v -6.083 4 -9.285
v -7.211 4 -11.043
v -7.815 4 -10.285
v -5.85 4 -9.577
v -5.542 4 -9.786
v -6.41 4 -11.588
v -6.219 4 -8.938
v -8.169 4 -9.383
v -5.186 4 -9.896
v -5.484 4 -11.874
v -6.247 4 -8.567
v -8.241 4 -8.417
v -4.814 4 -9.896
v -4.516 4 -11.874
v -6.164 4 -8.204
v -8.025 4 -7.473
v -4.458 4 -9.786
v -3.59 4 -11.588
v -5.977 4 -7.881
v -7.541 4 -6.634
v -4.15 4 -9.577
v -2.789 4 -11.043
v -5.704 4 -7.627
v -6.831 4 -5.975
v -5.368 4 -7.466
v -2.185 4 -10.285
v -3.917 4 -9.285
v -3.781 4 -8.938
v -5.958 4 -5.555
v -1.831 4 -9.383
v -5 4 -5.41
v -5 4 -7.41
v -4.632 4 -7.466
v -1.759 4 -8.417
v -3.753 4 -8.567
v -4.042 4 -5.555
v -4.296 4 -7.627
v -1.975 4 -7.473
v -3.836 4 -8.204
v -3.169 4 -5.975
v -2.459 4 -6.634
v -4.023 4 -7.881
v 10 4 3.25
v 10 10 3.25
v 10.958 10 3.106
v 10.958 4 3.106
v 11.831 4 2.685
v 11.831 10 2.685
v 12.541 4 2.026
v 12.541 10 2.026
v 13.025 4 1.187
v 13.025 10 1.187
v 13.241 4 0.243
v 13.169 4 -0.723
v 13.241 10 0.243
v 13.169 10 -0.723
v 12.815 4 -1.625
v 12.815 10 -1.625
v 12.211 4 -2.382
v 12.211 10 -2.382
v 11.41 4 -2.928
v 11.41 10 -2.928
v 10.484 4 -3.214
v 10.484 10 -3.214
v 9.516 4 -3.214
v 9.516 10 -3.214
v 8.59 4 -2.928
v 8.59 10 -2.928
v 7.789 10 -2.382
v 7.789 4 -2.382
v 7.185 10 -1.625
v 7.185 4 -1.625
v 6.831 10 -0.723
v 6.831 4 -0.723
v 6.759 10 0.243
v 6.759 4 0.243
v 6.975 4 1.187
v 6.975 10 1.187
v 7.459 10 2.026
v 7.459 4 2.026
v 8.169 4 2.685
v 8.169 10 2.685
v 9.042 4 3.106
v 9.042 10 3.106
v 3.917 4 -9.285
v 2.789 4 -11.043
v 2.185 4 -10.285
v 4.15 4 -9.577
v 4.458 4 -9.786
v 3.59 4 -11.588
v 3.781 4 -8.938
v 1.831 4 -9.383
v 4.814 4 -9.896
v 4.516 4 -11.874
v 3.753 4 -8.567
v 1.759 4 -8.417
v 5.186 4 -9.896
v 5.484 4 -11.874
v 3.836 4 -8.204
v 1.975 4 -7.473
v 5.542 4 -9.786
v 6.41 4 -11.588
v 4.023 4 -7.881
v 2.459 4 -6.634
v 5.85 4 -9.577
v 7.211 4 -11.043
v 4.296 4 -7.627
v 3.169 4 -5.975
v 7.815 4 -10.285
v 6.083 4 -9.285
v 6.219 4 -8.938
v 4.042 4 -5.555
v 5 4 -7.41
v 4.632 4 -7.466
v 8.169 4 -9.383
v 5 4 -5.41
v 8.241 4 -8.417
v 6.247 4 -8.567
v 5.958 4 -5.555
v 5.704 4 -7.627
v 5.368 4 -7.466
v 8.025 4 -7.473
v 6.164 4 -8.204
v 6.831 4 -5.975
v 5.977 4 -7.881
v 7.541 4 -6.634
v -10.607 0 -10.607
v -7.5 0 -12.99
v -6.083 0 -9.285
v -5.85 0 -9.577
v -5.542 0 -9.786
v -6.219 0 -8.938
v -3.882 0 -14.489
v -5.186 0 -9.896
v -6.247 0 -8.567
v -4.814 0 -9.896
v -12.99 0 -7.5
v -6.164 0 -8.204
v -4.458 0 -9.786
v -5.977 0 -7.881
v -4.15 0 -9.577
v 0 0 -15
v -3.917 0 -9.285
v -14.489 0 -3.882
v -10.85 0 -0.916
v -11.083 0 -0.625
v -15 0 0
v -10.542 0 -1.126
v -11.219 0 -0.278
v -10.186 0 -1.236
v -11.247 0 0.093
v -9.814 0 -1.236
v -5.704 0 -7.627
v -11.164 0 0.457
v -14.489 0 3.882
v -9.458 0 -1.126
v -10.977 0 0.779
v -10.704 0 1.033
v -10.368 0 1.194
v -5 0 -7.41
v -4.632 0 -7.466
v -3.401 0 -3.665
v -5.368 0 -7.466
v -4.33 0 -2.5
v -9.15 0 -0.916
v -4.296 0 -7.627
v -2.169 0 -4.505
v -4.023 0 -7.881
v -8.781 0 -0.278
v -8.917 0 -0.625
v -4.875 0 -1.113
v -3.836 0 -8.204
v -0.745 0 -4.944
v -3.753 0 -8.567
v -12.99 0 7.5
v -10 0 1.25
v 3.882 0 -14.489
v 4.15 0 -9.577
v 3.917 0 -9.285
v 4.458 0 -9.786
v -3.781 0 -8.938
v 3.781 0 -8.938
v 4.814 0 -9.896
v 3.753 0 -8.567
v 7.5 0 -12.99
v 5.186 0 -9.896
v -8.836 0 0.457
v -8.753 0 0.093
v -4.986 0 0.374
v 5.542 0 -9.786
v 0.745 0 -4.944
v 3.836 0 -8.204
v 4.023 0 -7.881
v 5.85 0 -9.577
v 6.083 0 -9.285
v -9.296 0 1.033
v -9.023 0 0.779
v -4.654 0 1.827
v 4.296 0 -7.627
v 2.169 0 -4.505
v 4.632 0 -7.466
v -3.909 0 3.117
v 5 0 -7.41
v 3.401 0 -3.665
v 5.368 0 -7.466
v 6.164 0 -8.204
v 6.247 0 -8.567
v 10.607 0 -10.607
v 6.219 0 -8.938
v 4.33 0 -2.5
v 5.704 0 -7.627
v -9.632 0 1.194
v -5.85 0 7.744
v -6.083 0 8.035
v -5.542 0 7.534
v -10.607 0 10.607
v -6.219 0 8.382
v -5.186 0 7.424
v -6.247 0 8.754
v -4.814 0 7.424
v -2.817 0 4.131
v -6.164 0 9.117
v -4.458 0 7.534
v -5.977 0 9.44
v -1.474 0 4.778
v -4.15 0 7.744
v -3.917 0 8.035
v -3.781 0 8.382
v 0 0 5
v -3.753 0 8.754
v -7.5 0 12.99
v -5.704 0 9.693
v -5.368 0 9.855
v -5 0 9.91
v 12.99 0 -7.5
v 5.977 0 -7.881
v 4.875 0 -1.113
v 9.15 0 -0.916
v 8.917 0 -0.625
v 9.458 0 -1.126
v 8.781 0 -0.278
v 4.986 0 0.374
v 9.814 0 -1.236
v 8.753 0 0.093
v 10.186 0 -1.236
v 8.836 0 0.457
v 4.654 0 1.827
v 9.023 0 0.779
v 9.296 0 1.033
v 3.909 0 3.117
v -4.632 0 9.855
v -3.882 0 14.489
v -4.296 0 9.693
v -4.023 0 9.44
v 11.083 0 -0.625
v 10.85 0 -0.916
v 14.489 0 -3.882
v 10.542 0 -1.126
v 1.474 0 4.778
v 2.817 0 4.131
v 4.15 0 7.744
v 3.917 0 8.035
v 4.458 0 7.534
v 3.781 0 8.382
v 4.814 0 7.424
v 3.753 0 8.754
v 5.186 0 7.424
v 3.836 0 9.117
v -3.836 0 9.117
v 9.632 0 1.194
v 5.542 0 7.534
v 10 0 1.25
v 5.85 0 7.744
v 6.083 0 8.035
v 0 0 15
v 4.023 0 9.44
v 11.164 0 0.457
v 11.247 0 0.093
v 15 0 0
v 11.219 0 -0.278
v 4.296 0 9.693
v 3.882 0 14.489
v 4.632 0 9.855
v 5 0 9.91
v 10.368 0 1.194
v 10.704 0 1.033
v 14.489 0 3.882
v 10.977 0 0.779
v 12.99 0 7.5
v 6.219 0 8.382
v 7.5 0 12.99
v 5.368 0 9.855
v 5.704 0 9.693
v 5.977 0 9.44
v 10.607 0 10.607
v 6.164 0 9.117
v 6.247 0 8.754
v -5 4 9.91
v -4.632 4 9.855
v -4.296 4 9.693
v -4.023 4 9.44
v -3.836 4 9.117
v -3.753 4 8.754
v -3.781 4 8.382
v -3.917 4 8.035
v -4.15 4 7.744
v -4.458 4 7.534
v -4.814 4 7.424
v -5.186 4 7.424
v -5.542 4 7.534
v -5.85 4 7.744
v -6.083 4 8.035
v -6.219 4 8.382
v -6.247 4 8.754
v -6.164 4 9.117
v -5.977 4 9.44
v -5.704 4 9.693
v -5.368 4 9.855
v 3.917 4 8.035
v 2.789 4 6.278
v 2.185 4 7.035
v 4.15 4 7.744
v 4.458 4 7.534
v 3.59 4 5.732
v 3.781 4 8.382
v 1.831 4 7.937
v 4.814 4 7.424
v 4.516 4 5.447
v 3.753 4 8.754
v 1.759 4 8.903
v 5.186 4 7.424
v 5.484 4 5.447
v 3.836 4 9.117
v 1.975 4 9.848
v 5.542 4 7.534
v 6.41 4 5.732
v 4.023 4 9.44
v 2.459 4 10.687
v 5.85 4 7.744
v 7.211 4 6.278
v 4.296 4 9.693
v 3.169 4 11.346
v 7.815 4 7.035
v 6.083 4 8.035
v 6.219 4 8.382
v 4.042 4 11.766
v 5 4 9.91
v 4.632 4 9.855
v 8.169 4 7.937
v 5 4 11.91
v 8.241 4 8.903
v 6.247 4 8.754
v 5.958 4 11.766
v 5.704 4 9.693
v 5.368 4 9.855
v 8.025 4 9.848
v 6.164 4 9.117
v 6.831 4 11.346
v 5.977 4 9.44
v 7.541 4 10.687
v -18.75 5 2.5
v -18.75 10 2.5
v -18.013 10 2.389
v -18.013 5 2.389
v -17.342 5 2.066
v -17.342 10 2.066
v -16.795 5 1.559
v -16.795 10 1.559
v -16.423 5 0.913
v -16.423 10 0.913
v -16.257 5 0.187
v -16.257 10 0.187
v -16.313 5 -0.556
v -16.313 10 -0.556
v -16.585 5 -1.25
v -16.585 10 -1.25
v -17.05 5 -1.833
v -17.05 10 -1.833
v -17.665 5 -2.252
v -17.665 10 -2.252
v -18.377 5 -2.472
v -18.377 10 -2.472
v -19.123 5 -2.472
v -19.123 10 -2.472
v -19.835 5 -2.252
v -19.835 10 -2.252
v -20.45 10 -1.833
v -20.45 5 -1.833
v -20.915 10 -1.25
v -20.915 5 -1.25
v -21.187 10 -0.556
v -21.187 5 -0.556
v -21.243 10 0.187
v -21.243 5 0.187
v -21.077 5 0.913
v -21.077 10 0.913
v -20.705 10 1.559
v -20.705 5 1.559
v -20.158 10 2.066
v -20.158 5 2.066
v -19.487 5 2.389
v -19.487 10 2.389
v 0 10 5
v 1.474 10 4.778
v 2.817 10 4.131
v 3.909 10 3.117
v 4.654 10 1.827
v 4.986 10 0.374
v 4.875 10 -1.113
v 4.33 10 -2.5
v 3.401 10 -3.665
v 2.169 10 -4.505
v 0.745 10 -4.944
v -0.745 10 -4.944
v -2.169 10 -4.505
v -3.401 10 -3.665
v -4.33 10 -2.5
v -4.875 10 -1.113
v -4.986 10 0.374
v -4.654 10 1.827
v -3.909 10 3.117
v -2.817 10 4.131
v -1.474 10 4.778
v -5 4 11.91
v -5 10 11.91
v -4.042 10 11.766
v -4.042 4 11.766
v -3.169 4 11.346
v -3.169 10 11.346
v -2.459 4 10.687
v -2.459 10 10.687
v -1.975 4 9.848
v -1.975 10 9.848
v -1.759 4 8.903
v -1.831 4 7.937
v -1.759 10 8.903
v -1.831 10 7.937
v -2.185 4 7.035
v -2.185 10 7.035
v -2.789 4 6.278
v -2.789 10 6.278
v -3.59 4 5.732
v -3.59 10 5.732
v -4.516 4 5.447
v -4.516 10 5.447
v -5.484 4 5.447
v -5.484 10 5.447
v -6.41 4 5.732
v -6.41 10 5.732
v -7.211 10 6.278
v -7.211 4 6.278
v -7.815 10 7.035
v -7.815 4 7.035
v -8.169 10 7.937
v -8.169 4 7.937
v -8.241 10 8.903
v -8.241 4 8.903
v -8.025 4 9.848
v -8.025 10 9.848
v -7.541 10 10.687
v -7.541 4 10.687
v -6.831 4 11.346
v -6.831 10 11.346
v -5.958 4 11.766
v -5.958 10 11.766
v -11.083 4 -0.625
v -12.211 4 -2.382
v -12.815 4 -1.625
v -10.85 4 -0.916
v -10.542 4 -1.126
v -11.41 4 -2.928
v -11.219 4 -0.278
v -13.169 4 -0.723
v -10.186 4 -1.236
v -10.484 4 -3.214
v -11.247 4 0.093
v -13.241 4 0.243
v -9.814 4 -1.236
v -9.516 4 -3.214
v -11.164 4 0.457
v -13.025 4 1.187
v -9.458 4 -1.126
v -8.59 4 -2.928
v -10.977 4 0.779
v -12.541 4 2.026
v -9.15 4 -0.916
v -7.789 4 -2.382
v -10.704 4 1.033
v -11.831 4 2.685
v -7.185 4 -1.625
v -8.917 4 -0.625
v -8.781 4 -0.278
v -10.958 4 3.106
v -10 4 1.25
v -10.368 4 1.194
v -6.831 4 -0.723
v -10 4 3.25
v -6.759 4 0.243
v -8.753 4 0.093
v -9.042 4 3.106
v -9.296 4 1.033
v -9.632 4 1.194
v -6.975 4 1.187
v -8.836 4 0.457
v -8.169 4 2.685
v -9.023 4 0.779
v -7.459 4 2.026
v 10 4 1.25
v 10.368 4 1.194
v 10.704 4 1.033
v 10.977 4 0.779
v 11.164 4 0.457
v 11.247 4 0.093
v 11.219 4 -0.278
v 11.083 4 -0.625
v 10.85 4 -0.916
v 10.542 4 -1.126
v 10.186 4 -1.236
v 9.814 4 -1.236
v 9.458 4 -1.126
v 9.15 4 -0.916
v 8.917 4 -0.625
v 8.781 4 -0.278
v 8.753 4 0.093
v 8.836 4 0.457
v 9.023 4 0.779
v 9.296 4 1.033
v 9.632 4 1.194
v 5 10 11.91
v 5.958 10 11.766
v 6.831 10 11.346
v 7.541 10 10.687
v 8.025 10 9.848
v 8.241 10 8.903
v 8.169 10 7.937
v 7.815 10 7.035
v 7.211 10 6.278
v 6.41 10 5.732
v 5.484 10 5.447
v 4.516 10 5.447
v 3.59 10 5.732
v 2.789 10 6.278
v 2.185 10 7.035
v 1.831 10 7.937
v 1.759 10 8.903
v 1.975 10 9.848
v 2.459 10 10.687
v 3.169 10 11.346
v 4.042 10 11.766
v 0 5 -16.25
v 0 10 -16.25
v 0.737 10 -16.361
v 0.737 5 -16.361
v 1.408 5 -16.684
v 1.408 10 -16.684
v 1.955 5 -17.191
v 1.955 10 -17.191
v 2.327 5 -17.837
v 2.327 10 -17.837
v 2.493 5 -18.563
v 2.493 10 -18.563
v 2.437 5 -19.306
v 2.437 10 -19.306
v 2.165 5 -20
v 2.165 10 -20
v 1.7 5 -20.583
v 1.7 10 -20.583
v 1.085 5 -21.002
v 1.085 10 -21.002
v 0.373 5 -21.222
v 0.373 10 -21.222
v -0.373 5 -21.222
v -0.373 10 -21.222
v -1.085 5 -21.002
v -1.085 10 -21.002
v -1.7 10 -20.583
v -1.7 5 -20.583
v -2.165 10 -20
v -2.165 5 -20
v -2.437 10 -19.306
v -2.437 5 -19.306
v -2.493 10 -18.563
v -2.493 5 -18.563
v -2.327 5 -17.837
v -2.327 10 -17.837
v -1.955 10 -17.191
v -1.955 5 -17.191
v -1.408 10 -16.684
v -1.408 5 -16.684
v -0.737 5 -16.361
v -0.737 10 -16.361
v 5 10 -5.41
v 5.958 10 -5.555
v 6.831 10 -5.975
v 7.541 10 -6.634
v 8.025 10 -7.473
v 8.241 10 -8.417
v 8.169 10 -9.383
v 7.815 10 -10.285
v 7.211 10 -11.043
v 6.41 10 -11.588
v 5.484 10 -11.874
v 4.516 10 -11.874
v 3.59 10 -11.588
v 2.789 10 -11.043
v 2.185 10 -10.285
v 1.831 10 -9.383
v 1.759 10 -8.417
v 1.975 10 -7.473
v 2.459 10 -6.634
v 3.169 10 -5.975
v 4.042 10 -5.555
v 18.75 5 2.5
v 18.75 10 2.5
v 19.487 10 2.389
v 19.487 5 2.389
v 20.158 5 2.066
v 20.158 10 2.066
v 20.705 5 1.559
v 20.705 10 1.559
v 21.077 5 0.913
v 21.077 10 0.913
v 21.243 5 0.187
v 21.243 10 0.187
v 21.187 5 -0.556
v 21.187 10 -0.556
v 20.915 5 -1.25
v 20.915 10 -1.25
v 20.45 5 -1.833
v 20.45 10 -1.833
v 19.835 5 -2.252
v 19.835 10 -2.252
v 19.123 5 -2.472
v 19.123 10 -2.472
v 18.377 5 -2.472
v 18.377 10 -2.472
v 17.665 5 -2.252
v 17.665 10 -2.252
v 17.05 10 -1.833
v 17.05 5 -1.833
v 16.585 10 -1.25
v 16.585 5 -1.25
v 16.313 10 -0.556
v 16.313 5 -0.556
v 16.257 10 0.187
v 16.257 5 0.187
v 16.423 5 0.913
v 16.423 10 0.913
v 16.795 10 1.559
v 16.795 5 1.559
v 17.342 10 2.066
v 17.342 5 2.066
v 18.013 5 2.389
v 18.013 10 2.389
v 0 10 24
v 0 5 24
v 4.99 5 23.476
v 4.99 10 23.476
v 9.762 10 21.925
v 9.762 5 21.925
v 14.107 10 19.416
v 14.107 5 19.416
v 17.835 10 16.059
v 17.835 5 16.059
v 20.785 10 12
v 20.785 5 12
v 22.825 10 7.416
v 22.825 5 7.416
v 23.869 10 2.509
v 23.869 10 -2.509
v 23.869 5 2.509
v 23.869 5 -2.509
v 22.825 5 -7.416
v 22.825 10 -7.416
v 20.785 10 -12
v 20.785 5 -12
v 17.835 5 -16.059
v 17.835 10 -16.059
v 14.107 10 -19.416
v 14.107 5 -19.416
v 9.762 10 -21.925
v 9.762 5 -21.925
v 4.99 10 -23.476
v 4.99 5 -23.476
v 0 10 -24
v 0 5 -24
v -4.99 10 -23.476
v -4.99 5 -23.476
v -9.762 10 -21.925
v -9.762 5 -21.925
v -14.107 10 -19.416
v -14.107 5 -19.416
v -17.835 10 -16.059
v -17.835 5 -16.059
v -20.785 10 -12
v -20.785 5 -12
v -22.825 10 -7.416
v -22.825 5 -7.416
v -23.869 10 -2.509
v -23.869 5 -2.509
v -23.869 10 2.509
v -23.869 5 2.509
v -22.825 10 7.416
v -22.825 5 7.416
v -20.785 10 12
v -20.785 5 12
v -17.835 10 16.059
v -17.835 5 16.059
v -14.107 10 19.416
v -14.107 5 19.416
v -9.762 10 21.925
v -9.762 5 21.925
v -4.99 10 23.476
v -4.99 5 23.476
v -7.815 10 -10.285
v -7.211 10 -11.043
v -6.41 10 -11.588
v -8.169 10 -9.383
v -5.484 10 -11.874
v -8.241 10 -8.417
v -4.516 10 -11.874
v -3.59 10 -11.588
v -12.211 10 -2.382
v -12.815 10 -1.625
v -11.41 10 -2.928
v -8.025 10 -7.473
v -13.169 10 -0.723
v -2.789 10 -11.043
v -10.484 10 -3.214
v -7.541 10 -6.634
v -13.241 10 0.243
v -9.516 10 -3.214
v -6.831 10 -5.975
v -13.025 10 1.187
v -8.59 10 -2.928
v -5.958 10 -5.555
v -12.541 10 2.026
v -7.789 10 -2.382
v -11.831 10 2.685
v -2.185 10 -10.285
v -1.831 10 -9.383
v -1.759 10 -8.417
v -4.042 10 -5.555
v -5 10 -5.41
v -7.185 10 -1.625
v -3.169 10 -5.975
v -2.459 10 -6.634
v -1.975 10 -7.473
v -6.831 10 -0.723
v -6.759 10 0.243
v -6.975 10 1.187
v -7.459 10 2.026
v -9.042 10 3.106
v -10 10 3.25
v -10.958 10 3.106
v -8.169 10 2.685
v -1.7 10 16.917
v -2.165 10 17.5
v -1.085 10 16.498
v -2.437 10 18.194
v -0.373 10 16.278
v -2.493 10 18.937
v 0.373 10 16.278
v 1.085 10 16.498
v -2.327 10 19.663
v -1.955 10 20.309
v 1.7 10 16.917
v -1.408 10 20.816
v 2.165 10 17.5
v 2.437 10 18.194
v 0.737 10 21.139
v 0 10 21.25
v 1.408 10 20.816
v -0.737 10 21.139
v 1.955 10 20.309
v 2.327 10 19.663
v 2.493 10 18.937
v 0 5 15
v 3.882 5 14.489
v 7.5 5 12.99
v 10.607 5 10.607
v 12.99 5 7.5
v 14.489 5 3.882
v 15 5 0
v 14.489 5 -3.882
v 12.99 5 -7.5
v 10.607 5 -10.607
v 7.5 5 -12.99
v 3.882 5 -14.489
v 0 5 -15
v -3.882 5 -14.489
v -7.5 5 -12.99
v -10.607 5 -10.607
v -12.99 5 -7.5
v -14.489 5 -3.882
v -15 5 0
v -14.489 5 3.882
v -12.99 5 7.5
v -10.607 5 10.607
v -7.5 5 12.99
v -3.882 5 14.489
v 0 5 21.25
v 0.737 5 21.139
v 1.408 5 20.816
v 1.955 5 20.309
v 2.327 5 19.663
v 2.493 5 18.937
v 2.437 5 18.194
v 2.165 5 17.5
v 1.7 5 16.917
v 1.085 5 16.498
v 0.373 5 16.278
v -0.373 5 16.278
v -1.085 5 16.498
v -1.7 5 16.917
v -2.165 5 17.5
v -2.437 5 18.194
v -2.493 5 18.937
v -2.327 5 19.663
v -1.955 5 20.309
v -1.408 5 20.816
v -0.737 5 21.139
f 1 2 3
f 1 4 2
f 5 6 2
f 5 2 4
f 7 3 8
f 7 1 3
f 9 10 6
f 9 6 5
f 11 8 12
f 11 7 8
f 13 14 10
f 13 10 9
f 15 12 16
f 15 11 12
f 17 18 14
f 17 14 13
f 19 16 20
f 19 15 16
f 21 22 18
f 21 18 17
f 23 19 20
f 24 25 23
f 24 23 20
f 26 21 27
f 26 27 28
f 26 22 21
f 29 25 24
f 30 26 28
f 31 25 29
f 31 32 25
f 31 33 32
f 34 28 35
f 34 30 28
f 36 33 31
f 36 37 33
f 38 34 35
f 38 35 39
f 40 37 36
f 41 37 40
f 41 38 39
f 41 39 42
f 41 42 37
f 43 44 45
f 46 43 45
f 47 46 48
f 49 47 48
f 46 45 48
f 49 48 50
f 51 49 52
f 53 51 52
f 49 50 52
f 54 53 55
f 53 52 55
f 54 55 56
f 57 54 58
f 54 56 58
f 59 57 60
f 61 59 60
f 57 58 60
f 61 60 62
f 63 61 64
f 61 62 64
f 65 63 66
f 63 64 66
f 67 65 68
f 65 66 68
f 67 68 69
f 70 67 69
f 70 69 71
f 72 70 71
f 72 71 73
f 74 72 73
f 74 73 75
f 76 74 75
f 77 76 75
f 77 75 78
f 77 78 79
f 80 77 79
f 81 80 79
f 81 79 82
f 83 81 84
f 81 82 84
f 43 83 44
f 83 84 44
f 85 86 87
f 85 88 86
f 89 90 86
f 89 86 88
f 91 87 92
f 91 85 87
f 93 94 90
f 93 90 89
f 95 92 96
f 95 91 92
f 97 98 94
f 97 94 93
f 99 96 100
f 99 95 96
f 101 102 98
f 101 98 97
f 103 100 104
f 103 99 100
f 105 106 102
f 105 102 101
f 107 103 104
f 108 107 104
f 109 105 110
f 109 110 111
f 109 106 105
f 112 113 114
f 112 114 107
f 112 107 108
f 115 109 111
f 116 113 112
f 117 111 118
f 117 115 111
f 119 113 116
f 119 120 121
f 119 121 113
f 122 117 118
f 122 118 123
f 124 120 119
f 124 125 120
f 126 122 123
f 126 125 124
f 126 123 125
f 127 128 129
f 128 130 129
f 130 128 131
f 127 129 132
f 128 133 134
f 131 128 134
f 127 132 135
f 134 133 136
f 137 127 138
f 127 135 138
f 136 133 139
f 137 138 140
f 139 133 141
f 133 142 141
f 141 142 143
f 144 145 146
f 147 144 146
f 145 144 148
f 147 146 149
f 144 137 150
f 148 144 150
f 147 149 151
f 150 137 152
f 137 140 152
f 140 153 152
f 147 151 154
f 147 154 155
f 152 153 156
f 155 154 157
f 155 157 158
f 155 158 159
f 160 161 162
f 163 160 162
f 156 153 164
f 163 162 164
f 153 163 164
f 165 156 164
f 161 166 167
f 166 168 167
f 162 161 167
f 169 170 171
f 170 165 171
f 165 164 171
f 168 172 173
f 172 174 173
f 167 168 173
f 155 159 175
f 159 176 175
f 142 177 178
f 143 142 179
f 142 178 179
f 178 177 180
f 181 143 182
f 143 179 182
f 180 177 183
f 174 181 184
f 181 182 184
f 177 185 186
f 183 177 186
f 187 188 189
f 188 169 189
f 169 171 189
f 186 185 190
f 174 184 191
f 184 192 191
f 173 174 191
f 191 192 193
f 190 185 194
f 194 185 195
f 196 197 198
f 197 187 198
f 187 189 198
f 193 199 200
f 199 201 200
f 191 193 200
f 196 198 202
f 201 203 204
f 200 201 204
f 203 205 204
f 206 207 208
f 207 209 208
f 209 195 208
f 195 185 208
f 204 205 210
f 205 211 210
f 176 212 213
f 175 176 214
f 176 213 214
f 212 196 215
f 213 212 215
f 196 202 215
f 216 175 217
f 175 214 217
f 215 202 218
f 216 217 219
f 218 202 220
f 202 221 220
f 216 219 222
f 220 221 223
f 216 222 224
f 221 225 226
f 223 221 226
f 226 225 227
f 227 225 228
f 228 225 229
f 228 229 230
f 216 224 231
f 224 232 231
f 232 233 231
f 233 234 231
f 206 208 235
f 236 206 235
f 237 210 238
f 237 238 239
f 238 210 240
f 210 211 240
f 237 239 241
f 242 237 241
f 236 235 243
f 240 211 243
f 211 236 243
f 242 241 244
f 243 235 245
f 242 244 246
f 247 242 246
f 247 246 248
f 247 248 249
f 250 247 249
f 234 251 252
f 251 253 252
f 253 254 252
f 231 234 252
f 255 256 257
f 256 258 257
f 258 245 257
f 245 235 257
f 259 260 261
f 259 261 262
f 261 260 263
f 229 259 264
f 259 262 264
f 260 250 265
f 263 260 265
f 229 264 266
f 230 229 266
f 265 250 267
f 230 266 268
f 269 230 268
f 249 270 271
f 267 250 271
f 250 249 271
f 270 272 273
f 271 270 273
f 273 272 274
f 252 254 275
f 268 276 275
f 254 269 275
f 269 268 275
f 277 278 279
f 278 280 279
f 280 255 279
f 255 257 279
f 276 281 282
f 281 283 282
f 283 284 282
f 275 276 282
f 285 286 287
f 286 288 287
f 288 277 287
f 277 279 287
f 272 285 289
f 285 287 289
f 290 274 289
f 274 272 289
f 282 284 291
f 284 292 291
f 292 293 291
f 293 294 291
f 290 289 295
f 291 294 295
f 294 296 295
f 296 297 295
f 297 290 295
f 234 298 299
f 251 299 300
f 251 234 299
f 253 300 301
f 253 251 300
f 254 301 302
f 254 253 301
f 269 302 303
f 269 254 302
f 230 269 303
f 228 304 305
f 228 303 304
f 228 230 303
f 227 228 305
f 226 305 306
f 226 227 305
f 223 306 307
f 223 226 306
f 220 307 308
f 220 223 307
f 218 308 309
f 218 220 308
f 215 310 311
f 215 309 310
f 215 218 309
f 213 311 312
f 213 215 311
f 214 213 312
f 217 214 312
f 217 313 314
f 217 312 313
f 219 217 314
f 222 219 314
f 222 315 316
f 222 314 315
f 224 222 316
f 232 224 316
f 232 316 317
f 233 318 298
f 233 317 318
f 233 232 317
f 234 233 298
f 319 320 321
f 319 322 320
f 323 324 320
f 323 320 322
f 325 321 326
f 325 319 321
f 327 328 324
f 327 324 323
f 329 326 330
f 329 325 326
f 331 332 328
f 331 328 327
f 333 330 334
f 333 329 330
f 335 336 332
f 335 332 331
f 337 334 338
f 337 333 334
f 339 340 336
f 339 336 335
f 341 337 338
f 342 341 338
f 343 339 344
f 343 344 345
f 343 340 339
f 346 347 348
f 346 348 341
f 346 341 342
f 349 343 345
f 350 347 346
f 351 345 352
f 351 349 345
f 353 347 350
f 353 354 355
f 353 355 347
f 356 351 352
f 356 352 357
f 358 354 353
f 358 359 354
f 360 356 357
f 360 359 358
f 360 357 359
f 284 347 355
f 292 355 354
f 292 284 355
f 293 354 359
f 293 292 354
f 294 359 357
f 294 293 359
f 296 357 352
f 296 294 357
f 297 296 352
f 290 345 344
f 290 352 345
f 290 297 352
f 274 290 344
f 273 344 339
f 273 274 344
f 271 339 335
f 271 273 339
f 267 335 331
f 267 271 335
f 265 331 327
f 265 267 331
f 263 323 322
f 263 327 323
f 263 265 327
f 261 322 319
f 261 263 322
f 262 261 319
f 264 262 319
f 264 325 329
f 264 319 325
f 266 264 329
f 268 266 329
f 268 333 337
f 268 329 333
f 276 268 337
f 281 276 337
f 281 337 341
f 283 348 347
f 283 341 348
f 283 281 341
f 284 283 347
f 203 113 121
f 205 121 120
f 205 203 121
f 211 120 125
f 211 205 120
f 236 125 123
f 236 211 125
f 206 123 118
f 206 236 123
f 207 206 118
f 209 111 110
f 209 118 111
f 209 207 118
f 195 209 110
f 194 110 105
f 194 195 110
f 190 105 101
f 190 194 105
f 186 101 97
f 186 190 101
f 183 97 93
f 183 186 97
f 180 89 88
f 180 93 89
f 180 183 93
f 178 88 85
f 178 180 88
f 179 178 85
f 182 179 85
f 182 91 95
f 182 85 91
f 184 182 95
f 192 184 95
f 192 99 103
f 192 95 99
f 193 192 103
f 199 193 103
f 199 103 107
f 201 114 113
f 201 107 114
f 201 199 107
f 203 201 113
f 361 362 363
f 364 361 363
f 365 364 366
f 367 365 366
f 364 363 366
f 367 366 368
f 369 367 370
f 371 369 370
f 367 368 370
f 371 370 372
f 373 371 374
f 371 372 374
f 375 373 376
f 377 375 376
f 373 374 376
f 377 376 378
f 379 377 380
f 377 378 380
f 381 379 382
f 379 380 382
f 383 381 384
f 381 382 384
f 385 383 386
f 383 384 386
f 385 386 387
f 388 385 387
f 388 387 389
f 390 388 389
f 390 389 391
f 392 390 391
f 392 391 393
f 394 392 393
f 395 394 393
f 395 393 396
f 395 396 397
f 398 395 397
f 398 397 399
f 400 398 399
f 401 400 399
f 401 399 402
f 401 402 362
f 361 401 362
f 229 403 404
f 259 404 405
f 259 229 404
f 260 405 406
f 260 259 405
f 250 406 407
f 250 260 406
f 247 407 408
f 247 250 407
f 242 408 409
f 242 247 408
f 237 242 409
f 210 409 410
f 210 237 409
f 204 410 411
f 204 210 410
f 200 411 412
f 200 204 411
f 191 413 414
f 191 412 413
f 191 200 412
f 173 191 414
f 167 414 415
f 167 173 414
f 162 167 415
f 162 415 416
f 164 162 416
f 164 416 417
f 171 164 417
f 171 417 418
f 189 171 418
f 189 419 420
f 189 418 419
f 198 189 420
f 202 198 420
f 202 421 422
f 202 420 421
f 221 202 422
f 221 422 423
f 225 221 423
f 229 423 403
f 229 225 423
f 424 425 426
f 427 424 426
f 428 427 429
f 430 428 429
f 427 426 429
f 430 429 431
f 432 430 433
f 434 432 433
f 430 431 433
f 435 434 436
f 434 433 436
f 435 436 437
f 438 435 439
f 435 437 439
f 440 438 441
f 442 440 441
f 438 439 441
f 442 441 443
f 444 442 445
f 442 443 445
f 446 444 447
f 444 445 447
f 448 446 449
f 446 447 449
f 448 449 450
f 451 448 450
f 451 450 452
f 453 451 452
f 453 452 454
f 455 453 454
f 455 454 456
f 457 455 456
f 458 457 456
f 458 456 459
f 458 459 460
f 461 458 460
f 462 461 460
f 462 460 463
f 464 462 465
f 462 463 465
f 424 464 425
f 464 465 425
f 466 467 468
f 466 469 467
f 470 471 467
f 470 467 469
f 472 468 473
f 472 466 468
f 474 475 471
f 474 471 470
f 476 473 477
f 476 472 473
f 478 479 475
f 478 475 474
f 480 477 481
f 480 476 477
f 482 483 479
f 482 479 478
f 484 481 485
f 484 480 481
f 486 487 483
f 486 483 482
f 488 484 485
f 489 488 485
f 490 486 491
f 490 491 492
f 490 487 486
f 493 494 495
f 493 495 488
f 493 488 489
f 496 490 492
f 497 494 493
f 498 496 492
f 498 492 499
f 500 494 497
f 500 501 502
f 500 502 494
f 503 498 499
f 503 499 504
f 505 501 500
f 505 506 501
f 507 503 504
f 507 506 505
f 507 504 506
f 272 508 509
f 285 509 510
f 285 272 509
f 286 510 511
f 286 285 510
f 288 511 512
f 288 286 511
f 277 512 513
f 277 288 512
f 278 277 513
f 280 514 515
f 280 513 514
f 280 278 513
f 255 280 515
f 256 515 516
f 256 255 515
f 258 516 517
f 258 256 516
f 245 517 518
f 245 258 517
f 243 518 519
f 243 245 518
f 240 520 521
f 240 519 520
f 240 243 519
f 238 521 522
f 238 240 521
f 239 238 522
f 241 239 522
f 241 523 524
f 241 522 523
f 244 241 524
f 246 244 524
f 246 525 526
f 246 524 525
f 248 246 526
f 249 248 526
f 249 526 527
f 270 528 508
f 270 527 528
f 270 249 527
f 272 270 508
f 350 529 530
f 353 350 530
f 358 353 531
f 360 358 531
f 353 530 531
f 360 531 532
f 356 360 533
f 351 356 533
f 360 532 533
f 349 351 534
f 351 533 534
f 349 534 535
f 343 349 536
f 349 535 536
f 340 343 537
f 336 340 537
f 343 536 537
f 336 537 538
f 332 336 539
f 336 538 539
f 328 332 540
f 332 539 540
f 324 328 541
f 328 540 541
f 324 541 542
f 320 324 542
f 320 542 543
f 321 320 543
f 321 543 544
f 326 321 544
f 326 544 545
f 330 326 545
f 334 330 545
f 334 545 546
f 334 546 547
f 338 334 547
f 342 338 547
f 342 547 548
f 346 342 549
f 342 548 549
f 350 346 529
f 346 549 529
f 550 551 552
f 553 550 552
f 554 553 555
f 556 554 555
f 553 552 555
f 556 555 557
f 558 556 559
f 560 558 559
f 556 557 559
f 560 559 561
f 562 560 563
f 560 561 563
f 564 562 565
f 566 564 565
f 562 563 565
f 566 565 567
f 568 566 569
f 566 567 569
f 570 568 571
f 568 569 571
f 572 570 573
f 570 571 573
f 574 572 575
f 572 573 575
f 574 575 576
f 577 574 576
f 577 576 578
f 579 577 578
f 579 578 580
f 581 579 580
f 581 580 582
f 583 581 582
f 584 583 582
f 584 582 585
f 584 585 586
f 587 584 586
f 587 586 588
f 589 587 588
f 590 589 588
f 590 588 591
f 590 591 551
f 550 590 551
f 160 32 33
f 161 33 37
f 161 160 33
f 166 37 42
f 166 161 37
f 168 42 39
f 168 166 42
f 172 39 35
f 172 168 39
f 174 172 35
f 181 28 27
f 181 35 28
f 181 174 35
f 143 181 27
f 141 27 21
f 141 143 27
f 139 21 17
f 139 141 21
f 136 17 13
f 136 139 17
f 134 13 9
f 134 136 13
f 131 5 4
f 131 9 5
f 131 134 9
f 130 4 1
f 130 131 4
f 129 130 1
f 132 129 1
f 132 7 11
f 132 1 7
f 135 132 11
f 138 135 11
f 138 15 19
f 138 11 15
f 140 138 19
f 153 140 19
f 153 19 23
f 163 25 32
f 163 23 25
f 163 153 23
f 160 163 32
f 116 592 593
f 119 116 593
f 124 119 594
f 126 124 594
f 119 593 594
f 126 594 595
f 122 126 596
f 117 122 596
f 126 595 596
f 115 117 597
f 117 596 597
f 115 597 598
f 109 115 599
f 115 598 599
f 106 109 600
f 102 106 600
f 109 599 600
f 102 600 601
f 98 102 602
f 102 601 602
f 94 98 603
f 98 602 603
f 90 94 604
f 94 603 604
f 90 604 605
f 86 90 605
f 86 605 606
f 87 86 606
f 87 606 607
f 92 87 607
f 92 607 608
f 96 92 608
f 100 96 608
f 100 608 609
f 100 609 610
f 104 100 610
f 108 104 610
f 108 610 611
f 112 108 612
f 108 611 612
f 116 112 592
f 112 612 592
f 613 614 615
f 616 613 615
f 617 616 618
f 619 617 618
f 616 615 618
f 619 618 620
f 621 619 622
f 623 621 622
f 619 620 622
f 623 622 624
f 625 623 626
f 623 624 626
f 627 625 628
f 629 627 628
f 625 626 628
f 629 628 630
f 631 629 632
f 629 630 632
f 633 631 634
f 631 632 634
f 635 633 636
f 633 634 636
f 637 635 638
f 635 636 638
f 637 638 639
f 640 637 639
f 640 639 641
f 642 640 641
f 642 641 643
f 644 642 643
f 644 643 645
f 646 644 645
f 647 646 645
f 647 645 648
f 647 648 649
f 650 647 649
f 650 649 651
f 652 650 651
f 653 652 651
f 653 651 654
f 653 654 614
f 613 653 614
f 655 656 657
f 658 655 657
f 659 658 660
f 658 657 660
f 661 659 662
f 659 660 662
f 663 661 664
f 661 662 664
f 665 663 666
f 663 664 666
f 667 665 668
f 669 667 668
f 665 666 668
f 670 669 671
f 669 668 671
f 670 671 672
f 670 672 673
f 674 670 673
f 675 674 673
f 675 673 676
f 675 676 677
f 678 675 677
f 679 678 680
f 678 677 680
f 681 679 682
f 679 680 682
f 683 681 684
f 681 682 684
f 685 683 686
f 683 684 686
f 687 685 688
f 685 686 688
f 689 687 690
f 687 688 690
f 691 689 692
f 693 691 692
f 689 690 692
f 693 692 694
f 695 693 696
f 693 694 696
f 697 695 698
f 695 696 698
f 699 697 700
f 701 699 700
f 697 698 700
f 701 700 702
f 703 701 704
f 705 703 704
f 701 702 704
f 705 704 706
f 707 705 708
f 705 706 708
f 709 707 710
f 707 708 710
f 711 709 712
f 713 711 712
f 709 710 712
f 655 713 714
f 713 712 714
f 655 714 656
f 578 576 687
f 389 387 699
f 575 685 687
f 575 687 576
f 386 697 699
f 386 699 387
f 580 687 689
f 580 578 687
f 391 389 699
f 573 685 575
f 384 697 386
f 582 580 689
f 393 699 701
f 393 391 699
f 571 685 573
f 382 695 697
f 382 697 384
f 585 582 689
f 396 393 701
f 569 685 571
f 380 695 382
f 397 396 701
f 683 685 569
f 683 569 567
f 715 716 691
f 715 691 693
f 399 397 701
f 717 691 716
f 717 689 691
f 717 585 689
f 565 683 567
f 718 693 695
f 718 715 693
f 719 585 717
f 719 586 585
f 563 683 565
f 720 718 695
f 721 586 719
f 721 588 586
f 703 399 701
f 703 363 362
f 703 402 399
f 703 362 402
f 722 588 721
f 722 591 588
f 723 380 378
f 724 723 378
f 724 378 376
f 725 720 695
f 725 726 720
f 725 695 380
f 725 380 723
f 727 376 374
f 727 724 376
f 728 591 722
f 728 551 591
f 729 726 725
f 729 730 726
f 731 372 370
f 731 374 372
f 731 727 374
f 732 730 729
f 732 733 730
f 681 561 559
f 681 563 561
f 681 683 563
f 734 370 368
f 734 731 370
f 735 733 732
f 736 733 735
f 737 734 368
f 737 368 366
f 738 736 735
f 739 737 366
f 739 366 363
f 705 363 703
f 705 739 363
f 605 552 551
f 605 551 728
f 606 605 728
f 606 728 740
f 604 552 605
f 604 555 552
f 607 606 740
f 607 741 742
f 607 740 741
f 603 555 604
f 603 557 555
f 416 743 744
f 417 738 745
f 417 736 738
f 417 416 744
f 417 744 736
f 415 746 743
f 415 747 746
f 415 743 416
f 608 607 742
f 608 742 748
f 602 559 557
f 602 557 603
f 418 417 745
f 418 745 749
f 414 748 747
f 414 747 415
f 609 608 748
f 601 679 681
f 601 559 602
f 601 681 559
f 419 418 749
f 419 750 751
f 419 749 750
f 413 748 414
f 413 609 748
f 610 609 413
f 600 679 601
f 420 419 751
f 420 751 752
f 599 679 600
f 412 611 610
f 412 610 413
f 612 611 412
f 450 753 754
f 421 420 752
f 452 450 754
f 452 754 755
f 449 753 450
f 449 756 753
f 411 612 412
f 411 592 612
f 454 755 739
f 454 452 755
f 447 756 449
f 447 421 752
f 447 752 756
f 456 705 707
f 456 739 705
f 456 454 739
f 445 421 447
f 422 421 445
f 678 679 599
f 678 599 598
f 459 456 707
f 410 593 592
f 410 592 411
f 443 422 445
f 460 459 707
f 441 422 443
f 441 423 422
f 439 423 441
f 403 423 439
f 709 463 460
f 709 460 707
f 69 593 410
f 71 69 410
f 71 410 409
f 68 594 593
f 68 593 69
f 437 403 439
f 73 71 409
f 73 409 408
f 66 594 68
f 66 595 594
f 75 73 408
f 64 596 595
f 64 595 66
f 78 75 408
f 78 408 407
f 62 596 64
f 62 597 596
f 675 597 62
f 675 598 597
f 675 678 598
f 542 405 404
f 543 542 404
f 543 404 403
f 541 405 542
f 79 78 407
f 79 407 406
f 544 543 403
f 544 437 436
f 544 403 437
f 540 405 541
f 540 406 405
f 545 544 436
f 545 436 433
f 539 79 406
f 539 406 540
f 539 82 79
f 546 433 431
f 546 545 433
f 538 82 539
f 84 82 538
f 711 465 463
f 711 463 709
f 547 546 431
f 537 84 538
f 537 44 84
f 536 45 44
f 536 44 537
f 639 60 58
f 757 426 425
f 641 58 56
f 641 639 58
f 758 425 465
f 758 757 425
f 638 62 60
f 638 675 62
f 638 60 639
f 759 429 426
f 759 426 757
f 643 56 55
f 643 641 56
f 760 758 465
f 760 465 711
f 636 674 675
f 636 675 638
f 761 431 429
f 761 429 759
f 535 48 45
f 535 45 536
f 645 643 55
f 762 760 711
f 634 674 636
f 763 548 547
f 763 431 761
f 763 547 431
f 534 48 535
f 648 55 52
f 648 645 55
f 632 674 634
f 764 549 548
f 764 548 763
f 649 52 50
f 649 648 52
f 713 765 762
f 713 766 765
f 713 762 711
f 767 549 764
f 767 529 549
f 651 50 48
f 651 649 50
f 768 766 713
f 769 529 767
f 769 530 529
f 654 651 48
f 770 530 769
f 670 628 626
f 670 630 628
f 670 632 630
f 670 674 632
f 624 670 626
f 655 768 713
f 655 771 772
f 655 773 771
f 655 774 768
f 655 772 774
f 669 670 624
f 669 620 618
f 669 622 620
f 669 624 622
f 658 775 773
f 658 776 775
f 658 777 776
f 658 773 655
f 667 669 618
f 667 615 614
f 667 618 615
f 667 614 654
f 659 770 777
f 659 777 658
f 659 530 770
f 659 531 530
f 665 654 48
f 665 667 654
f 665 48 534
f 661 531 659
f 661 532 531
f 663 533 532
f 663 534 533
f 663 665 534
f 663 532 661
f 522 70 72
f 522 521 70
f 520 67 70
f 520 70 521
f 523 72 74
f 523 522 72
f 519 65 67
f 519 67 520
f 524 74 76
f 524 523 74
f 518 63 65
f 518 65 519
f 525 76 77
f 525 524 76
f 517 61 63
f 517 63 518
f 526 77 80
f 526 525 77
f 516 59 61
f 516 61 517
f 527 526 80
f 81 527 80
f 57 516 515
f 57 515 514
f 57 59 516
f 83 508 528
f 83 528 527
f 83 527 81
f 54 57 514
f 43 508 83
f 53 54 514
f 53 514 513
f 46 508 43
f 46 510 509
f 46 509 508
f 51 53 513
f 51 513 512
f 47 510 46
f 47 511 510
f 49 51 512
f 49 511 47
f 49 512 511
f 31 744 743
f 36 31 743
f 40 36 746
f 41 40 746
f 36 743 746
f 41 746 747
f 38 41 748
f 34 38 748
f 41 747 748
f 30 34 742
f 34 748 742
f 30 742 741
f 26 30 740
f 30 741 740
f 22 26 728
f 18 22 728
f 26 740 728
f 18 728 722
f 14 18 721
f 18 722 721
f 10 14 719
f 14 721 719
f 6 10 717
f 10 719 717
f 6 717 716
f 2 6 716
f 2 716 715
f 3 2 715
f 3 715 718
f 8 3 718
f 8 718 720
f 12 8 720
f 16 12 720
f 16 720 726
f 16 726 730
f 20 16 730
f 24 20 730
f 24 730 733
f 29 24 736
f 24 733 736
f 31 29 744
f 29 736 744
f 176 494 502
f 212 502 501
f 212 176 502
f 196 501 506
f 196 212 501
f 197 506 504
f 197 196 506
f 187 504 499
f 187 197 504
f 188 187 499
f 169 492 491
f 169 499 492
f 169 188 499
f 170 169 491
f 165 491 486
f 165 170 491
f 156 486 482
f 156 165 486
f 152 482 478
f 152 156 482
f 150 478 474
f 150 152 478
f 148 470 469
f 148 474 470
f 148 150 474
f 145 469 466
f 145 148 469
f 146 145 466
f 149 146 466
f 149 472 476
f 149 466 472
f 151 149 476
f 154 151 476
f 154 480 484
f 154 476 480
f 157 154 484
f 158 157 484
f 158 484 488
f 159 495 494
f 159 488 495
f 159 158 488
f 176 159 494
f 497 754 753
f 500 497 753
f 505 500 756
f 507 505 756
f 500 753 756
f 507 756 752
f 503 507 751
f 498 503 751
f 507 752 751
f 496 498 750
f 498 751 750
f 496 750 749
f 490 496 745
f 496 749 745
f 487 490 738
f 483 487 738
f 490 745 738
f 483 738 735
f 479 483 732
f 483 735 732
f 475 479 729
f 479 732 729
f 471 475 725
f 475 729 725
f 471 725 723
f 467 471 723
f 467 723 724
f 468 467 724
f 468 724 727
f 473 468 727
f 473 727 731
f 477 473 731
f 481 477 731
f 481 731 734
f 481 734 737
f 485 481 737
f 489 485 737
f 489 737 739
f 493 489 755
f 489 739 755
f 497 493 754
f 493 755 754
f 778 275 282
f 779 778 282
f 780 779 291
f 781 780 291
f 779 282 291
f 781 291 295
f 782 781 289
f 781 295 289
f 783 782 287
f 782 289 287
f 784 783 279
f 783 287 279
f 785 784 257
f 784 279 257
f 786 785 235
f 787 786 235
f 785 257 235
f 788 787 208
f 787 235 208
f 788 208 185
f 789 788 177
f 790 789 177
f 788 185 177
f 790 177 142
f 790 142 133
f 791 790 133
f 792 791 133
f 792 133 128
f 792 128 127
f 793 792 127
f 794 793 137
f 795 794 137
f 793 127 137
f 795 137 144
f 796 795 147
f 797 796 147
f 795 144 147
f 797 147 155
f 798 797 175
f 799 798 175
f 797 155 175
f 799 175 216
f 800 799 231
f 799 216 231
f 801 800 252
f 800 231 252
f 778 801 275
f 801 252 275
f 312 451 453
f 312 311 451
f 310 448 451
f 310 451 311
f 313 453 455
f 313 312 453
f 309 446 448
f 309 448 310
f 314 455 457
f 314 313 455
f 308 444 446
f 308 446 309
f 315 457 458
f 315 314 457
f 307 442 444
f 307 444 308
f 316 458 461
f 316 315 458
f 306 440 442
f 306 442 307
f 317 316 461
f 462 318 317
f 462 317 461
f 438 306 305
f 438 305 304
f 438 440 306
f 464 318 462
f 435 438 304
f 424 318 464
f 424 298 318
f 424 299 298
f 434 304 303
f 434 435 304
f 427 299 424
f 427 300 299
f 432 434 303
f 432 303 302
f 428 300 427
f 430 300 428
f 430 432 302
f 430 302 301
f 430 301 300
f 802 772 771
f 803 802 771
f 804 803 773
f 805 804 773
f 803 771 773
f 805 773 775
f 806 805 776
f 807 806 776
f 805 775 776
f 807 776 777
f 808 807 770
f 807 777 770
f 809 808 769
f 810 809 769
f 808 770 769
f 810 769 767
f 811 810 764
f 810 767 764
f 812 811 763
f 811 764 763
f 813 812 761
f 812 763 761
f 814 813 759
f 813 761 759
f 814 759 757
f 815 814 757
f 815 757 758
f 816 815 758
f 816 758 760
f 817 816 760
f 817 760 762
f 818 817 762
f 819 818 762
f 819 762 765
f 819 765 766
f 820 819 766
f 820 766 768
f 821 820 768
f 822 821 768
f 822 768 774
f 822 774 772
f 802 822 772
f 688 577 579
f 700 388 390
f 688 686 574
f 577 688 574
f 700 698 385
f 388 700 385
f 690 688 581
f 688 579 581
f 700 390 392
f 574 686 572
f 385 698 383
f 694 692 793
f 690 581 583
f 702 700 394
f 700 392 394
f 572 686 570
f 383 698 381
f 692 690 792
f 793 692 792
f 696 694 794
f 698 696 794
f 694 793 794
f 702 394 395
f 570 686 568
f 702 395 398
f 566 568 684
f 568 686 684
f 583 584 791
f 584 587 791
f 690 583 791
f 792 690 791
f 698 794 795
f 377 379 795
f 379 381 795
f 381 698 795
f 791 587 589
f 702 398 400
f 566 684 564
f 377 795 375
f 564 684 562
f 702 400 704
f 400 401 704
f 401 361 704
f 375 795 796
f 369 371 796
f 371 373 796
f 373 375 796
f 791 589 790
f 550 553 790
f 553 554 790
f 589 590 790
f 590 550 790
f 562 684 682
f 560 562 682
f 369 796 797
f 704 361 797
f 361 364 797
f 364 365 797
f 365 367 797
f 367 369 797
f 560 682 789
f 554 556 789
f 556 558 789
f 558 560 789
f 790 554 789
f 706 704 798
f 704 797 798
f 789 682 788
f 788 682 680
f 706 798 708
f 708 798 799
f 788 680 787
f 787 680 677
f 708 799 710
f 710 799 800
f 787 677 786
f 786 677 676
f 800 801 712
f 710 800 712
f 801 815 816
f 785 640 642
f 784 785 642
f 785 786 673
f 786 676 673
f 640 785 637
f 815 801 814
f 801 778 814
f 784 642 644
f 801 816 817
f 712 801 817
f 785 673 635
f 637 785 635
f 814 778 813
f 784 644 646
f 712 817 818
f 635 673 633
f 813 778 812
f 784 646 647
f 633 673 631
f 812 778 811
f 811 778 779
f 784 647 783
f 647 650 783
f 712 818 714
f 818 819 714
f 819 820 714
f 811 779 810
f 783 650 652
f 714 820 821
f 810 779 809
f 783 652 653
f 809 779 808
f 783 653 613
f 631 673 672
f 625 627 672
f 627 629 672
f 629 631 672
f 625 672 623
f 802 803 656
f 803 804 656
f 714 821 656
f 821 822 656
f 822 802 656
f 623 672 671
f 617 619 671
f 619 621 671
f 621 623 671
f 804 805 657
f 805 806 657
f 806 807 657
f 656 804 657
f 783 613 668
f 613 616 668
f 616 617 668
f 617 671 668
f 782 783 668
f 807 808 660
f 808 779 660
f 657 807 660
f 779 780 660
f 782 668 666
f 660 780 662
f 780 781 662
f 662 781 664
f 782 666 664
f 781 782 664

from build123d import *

# Parameters (mm, degrees)
SKETCH1_R           = 15
BOSS_EXTRUDE1_DEPTH = 5
SKETCH3_R           = 24
BOSS_EXTRUDE3_DEPTH = 5
SKETCH2_R           = 1.25
SKETCH2_R_2         = 5
CUT_EXTRUDE1_DEPTH  = 11.5
SKETCH4_R           = 3.25
CUT_EXTRUDE2_DEPTH  = 6
SKETCH5_R           = 2.5
CUT_EXTRUDE3_DEPTH  = 6.5


with BuildPart() as part:
    # Sketch1 → Boss-Extrude1 (new body)
    with BuildSketch(Plane(origin=(0, 0, 0), x_dir=(1, 0, 0), z_dir=(0, 1, 0))):
        with Locations(Location((0, 0, 0), (0, 0, 270))):
            Circle(SKETCH1_R)
    extrude(amount=BOSS_EXTRUDE1_DEPTH)

    # Sketch3 → Boss-Extrude3 (add)
    with BuildSketch(Plane(origin=(0, 5, 0), x_dir=(1, 0, 0), z_dir=(0, 1, 0))):
        with Locations(Location((0, 0, 0), (0, 0, 270))):
            Circle(SKETCH3_R)
    extrude(amount=BOSS_EXTRUDE3_DEPTH)

    # Sketch2 → Cut-Extrude1 (cut)
    with BuildSketch(Plane(origin=(0, 0, 0), x_dir=(1, 0, 0), z_dir=(0, 1, 0))):
        with Locations(Location((-5, 8.660254038, 0), (0, 0, 270))):
            Circle(SKETCH2_R)
        with Locations(Location((5, 8.660254038, 0), (0, 0, 270))):
            Circle(SKETCH2_R)
        with Locations(Location((10, 0, 0), (0, 0, 270))):
            Circle(SKETCH2_R)
        with Locations(Location((5, -8.660254038, 0), (0, 0, 270))):
            Circle(SKETCH2_R)
        with Locations(Location((-5, -8.660254038, 0), (0, 0, 270))):
            Circle(SKETCH2_R)
        with Locations(Location((-10, 0, 0), (0, 0, 270))):
            Circle(SKETCH2_R)
        with Locations(Location((0, 0, 0), (0, 0, 270))):
            Circle(SKETCH2_R_2)
    extrude(amount=CUT_EXTRUDE1_DEPTH, mode=Mode.SUBTRACT)

    # Sketch4 → Cut-Extrude2 (cut)
    with BuildSketch(Plane(origin=(0, 10, 0), x_dir=(1, 0, 0), z_dir=(0, 1, 0))):
        with Locations(Location((10, 0, 0), (0, 0, 270))):
            Circle(SKETCH4_R)
        with Locations(Location((5, 8.660254038, 0), (0, 0, 270))):
            Circle(SKETCH4_R)
        with Locations(Location((5, -8.660254038, 0), (0, 0, 270))):
            Circle(SKETCH4_R)
        with Locations(Location((-5, -8.660254038, 0), (0, 0, 270))):
            Circle(SKETCH4_R)
        with Locations(Location((-10, 0, 0), (0, 0, 270))):
            Circle(SKETCH4_R)
        with Locations(Location((-5, 8.660254038, 0), (0, 0, 270))):
            Circle(SKETCH4_R)
    extrude(amount=-CUT_EXTRUDE2_DEPTH, mode=Mode.SUBTRACT)

    # Sketch5 → Cut-Extrude3 (cut)
    with BuildSketch(Plane(origin=(0, 10, 0), x_dir=(1, 0, 0), z_dir=(0, 1, 0))):
        with Locations(Location((0, 18.75, 0), (0, 0, 270))):
            Circle(SKETCH5_R)
        with Locations(Location((18.75, 0, 0), (0, 0, 270))):
            Circle(SKETCH5_R)
        with Locations(Location((0, -18.75, 0), (0, 0, 270))):
            Circle(SKETCH5_R)
        with Locations(Location((-18.75, 0, 0), (0, 0, 270))):
            Circle(SKETCH5_R)
    extrude(amount=-CUT_EXTRUDE3_DEPTH, mode=Mode.SUBTRACT)


solid = part.part
